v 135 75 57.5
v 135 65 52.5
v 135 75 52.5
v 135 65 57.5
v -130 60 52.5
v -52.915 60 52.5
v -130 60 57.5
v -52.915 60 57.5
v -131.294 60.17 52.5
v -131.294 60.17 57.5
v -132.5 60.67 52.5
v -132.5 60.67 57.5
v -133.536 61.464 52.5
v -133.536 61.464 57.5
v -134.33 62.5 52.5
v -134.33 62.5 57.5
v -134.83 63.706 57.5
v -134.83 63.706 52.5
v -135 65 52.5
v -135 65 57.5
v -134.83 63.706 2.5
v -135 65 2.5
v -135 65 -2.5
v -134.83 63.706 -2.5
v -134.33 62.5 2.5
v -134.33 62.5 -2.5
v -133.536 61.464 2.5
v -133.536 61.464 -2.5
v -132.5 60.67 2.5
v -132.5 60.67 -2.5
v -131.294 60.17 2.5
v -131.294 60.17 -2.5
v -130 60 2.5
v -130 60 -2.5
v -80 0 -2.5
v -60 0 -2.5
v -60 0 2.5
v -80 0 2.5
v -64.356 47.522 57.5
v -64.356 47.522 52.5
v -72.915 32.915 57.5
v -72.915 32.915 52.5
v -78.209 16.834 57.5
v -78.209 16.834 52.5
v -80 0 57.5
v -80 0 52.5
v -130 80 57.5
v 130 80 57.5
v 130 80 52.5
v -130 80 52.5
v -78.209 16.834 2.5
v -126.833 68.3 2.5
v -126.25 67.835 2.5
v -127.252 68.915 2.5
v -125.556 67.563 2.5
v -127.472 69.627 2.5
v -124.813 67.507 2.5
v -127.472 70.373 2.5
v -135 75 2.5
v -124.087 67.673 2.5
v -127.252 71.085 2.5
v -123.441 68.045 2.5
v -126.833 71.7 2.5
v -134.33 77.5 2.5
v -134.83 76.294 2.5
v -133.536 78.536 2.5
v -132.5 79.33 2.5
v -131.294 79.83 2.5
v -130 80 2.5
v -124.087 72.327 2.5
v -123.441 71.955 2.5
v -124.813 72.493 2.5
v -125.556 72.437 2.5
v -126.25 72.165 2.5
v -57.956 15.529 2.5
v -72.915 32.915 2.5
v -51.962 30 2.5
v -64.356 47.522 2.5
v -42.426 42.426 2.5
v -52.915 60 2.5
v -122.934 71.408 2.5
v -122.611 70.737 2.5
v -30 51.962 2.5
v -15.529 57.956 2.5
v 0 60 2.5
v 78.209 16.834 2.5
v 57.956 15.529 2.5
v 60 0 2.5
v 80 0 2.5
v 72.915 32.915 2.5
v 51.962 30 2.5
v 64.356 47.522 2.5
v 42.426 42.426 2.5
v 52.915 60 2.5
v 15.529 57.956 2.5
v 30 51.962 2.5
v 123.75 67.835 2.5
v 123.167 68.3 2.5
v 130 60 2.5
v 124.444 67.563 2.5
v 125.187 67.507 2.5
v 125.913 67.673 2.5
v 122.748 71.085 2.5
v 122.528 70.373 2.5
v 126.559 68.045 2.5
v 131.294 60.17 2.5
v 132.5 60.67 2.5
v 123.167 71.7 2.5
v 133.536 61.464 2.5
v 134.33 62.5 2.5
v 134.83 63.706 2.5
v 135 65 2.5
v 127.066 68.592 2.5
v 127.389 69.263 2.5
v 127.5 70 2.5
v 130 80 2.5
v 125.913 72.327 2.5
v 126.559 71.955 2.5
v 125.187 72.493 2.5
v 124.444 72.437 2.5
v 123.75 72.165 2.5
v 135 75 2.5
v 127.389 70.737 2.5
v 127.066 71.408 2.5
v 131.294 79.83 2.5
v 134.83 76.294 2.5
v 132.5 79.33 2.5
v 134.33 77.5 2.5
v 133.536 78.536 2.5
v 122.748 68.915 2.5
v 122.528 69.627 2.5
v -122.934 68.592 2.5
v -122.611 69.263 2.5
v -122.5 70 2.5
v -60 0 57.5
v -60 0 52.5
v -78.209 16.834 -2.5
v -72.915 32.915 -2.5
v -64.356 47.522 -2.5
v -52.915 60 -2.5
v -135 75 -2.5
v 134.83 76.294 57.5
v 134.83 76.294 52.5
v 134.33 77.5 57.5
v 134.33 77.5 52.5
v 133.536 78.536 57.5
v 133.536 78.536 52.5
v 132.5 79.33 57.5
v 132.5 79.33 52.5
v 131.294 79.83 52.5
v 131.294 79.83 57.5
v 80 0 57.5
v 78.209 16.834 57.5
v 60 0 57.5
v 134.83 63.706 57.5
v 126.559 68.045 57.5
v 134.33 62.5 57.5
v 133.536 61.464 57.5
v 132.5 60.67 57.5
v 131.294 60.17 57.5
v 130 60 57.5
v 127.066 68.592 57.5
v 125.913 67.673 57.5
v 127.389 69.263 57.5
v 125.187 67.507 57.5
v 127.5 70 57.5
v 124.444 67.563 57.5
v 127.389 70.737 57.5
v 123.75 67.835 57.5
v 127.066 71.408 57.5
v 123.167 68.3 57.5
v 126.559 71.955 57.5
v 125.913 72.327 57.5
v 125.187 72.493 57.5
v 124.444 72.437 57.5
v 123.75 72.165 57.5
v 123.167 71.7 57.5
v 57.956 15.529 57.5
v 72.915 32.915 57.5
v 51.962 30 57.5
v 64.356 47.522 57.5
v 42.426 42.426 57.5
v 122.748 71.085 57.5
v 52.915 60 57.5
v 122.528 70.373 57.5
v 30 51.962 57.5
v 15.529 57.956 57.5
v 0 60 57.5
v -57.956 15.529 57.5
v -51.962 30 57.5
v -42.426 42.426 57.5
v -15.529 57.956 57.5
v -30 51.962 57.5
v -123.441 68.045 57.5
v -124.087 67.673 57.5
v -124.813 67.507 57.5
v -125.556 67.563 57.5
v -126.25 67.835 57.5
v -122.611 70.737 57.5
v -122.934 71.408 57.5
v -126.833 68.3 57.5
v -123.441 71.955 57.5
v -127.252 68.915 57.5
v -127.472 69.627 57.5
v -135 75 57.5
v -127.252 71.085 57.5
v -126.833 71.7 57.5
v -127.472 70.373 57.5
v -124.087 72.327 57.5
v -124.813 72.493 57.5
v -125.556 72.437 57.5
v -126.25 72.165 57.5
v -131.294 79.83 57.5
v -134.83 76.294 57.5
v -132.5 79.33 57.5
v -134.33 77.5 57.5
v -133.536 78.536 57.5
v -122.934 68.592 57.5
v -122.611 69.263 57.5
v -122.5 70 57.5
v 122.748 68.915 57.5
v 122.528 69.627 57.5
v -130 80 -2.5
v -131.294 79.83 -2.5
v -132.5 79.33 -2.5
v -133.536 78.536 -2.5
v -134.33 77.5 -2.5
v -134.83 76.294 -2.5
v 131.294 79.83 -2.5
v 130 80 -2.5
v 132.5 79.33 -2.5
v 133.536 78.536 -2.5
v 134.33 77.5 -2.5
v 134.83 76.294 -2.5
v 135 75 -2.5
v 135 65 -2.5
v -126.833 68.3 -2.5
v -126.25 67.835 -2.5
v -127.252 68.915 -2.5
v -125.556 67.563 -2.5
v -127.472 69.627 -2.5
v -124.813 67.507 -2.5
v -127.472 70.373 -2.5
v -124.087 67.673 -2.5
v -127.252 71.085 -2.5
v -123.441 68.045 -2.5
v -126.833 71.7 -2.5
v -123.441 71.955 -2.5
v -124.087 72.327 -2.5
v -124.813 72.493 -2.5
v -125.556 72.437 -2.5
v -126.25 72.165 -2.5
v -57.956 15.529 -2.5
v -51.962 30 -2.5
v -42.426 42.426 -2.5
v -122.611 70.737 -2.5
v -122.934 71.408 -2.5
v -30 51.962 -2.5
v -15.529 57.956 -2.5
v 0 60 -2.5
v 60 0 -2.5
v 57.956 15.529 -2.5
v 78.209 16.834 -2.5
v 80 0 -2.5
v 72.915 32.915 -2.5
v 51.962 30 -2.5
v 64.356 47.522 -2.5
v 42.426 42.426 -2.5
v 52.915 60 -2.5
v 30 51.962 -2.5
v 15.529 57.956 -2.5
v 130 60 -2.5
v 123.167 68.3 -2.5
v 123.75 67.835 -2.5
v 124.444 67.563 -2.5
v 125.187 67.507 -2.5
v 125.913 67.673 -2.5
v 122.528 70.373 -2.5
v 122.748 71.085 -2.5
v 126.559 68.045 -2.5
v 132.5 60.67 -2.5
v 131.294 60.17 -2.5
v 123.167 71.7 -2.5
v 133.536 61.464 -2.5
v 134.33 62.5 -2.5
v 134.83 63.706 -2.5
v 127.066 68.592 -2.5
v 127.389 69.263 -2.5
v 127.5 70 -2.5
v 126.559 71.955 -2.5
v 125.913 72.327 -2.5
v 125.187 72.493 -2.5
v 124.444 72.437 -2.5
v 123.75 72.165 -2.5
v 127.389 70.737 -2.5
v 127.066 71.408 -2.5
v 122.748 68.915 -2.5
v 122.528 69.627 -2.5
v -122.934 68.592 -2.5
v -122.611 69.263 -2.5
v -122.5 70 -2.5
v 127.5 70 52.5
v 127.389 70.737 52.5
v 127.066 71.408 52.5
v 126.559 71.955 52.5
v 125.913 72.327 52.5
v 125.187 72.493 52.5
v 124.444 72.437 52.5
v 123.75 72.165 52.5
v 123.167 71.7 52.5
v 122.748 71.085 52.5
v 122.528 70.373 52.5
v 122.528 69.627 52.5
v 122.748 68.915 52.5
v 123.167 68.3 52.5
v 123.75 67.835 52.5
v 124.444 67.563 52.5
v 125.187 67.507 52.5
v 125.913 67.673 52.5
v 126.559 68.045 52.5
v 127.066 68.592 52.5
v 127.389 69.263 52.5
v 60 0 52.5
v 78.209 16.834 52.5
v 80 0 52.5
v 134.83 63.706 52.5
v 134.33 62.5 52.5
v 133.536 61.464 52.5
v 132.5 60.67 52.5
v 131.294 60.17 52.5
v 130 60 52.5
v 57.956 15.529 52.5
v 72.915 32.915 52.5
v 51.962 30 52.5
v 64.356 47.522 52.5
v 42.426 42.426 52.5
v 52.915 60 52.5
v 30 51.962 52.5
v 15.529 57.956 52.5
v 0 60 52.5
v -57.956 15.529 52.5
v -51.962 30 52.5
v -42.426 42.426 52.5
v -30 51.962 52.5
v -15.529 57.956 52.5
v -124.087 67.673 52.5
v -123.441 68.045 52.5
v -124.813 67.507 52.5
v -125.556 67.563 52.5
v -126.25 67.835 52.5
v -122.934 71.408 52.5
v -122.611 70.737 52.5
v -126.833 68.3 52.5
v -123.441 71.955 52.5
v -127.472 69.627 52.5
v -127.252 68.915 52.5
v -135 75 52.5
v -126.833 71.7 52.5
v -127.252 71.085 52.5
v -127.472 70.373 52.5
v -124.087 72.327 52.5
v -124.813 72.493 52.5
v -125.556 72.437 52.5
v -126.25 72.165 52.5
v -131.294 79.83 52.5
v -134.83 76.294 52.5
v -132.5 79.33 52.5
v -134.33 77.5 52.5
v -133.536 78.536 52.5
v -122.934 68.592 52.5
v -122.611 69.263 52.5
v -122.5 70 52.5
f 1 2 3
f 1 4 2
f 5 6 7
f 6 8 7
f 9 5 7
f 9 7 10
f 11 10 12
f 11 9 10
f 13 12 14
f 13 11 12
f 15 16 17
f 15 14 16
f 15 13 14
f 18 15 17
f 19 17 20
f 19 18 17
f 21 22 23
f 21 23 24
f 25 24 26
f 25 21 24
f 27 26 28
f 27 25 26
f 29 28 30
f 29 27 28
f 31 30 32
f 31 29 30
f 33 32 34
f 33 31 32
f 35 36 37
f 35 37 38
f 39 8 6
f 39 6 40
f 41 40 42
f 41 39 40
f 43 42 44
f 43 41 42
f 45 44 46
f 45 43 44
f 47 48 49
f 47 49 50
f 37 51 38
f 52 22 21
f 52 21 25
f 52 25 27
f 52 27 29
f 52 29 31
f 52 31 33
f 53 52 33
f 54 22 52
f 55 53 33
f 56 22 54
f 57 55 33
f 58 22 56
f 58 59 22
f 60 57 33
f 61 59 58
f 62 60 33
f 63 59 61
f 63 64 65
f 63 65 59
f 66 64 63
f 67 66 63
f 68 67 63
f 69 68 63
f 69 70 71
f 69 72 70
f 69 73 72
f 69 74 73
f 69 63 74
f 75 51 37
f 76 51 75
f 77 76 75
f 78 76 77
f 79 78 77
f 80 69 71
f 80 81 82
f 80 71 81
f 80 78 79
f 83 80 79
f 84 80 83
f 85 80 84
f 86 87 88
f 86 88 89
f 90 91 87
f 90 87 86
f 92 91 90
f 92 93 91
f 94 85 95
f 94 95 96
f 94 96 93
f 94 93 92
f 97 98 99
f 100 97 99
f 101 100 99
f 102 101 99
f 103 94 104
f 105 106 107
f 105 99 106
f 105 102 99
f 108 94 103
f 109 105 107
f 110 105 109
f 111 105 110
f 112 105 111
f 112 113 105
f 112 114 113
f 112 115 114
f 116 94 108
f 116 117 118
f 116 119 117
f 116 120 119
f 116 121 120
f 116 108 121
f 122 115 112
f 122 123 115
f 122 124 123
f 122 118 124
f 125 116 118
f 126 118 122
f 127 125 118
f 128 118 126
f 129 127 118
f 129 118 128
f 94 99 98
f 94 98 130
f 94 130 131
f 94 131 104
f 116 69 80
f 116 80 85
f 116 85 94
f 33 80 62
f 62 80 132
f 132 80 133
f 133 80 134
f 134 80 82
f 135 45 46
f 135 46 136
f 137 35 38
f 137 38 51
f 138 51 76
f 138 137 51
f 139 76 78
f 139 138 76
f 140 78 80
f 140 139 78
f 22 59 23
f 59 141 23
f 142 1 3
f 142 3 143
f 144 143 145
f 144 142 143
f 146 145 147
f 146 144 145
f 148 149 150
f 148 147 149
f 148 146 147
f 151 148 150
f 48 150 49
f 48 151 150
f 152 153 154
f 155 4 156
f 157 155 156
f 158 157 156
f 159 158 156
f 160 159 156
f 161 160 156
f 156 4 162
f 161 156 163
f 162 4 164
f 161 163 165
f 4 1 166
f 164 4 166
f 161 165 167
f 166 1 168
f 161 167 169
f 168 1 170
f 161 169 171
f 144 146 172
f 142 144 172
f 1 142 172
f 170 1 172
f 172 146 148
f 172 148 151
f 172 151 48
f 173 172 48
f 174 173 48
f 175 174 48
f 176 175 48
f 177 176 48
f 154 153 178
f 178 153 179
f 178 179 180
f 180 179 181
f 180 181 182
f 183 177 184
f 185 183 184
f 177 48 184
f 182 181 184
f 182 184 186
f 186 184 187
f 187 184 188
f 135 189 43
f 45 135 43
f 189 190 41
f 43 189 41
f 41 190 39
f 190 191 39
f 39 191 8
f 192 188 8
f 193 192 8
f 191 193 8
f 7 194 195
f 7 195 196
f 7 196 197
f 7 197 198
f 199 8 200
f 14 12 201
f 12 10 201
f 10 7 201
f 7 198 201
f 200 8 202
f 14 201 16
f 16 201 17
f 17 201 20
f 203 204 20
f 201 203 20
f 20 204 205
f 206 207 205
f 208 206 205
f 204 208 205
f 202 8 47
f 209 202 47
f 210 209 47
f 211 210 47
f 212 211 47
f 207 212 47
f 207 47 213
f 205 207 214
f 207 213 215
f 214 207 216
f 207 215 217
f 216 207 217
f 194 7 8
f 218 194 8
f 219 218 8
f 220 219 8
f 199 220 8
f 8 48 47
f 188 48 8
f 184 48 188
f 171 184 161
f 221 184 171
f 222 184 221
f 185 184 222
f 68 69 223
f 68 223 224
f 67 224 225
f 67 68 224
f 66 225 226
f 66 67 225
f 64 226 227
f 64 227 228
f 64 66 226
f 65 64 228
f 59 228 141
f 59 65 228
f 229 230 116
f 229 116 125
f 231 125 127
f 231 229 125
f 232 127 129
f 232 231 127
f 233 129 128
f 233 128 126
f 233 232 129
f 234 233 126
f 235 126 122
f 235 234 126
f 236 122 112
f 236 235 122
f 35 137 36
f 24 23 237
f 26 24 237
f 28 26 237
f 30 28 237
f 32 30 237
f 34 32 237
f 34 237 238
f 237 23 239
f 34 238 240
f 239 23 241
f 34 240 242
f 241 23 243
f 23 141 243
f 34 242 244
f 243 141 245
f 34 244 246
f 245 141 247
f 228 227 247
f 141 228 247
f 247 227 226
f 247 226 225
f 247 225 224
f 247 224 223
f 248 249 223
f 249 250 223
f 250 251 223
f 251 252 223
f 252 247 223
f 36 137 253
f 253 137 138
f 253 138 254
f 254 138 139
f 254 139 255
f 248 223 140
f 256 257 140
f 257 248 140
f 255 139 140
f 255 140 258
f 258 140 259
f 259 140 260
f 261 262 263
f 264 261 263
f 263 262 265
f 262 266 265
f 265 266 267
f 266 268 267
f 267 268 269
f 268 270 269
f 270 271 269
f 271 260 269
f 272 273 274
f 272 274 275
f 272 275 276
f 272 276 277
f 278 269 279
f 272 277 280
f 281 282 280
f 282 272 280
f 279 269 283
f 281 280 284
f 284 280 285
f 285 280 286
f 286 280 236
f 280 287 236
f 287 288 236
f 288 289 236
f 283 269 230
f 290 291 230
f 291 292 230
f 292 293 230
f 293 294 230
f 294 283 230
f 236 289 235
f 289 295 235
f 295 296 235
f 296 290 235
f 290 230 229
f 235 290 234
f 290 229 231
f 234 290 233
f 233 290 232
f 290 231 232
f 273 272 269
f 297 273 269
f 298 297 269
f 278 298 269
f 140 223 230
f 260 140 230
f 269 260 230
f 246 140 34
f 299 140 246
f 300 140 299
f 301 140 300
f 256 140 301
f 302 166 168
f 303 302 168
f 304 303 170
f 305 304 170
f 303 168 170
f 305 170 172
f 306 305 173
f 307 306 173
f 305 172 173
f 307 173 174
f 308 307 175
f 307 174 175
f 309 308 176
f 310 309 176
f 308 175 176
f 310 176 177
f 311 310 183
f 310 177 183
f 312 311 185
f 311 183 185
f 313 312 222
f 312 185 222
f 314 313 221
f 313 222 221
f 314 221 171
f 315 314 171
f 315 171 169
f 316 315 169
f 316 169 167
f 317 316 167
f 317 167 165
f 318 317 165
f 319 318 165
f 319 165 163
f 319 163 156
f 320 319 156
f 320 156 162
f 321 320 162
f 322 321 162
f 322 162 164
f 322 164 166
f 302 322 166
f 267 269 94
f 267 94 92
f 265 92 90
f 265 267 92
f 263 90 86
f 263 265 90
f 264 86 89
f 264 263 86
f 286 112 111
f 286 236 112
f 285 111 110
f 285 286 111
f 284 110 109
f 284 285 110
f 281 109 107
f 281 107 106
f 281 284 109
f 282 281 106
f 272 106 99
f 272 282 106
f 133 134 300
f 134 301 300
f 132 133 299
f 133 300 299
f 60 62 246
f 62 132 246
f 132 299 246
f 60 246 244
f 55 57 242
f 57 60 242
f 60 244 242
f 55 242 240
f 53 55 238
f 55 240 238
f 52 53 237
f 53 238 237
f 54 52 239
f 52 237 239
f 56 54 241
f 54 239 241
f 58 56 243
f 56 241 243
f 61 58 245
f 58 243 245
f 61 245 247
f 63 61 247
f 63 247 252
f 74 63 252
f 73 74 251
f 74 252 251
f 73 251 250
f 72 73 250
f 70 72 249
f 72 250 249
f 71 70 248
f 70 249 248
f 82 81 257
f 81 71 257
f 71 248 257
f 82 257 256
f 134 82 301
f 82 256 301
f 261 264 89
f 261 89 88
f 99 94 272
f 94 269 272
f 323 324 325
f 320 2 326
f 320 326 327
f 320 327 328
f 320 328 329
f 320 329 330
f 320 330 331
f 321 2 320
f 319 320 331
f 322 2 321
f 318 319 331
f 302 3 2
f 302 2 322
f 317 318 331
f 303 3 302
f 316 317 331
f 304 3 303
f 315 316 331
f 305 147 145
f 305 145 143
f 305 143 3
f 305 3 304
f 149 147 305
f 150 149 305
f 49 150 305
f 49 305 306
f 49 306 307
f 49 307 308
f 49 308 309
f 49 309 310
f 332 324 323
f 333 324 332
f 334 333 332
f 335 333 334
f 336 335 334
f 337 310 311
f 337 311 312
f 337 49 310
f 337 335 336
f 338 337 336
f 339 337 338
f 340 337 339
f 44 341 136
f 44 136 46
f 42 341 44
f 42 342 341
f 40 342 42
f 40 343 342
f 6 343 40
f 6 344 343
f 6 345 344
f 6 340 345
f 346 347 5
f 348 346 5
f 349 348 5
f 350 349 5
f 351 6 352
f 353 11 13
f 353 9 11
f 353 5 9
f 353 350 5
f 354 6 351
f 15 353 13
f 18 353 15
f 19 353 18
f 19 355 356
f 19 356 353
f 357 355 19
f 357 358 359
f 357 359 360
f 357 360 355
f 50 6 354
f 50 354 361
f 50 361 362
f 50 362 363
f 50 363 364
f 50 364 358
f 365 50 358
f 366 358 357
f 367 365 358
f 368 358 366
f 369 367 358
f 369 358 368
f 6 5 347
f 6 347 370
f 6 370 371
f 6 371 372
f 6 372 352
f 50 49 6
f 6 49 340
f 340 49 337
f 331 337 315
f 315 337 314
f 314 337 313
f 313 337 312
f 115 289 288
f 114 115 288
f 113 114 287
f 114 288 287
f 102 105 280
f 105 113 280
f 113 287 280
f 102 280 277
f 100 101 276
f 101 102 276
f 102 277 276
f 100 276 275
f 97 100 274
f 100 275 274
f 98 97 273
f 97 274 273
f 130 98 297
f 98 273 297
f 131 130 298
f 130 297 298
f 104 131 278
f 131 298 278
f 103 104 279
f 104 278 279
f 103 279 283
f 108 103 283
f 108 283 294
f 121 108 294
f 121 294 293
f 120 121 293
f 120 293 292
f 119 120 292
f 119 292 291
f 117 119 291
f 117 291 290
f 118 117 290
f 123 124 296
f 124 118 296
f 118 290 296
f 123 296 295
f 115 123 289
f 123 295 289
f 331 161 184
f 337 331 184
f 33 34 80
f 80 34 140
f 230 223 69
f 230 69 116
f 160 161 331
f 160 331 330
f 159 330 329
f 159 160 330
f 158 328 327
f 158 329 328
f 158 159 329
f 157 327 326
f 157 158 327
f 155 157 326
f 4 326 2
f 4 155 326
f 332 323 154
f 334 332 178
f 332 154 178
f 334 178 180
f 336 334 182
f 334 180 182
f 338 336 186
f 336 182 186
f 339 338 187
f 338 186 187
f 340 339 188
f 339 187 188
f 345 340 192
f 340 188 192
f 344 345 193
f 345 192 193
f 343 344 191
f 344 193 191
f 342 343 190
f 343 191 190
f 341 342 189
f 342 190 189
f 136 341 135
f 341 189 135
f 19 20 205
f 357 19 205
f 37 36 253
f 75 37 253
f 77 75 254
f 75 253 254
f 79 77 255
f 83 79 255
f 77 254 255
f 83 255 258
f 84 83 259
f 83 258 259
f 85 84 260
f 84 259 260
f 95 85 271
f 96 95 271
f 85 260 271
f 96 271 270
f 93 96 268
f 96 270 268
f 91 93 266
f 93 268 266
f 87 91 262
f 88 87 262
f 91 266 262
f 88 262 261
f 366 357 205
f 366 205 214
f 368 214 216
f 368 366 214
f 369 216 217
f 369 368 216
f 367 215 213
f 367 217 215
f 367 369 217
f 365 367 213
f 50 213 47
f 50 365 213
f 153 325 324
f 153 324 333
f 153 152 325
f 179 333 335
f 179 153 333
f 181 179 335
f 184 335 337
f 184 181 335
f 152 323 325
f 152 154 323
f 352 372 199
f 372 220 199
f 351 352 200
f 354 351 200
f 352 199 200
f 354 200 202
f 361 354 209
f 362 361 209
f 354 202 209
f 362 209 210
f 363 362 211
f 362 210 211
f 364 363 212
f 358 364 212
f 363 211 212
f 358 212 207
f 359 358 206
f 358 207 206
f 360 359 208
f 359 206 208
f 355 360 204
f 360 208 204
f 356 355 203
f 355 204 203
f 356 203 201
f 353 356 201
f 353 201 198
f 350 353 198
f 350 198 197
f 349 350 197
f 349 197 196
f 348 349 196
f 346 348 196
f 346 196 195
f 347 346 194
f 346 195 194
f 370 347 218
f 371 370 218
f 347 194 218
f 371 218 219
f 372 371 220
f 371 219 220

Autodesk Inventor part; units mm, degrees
ref_plane "YZ Plane" through (0, 0, 0) normal (1, 0, 0) x (0, 1, 0)
ref_plane "XZ Plane" through (0, 0, 0) normal (0, 1, 0) x (-1, 0, 0)
ref_plane "XY Plane" through (0, 0, 0) normal (0, 0, 1) x (1, 0, 0)
sketch "Sketch1" plane through (0, 0, 0) normal (0, 0, 1) x (1, 0, 0)
  line L0 (-135, 80) -> (135, 80)
  line L1 (-135, 80) -> (-135, 60)
  line L2 (135, 80) -> (135, 60)
  line L3 (-135, 60) -> (135, 60)
  arc A0 (60, 0) -> (-60, 0) centre (0, 0) ccw
  arc A1 (80, 0) -> (-80, 0) centre (0, 0) ccw
  line L4 (80, 0) -> (60, 0)
  line L5 (60, 0) -> (80, 0)
  line L6 (-60, 0) -> (-80, 0)
  circle A2 centre (125, 70) radius 2.5
  circle A3 centre (-125, 70) radius 2.5
  point P0 (0, 80)
  point P1 (52.915, 60)
  point P2 (-52.915, 60)
  point P3 (-135, 70)
  point P4 (-125, 80)
  point P5 (-125, 60)
  point P6 (125, 60)
  point P7 (125, 80)
  point P8 (135, 70)
  point P9 (-135, 70)
  point P10 (0, 80)
  point P11 (0, 60)
  dimension "d0" = 270
  dimension "d1" = 80
  dimension "d2" = 20
  dimension "d10" = 5
  dimension "d11" = 10
  dimension "d12" = 10
  dimension "d13" = 5
  dimension "d14" = 10
  dimension "d15" = 10
extrude "Extrusion2" add sketch "Sketch1" along normal mid plane 5
ref_plane "Work Plane3" through (0, 0, 27.5) normal (0, 0, 1) x (1, 0, 0)
mirror "Mirror2" about plane through (0, 0, 27.5) normal (0, 0, 1) of "Extrusion2"
fillet "Fillet1" radius 5 8 edges at (135, 80, 0) (135, 60, 0) (135, 80, 55) (135, 60, 55) (-135, 80, 0) (-135, 60, 0) (-135, 80, 55) (-135, 60, 55)
properties part number "Conveyor_001_001" material "ABS Plastic"
